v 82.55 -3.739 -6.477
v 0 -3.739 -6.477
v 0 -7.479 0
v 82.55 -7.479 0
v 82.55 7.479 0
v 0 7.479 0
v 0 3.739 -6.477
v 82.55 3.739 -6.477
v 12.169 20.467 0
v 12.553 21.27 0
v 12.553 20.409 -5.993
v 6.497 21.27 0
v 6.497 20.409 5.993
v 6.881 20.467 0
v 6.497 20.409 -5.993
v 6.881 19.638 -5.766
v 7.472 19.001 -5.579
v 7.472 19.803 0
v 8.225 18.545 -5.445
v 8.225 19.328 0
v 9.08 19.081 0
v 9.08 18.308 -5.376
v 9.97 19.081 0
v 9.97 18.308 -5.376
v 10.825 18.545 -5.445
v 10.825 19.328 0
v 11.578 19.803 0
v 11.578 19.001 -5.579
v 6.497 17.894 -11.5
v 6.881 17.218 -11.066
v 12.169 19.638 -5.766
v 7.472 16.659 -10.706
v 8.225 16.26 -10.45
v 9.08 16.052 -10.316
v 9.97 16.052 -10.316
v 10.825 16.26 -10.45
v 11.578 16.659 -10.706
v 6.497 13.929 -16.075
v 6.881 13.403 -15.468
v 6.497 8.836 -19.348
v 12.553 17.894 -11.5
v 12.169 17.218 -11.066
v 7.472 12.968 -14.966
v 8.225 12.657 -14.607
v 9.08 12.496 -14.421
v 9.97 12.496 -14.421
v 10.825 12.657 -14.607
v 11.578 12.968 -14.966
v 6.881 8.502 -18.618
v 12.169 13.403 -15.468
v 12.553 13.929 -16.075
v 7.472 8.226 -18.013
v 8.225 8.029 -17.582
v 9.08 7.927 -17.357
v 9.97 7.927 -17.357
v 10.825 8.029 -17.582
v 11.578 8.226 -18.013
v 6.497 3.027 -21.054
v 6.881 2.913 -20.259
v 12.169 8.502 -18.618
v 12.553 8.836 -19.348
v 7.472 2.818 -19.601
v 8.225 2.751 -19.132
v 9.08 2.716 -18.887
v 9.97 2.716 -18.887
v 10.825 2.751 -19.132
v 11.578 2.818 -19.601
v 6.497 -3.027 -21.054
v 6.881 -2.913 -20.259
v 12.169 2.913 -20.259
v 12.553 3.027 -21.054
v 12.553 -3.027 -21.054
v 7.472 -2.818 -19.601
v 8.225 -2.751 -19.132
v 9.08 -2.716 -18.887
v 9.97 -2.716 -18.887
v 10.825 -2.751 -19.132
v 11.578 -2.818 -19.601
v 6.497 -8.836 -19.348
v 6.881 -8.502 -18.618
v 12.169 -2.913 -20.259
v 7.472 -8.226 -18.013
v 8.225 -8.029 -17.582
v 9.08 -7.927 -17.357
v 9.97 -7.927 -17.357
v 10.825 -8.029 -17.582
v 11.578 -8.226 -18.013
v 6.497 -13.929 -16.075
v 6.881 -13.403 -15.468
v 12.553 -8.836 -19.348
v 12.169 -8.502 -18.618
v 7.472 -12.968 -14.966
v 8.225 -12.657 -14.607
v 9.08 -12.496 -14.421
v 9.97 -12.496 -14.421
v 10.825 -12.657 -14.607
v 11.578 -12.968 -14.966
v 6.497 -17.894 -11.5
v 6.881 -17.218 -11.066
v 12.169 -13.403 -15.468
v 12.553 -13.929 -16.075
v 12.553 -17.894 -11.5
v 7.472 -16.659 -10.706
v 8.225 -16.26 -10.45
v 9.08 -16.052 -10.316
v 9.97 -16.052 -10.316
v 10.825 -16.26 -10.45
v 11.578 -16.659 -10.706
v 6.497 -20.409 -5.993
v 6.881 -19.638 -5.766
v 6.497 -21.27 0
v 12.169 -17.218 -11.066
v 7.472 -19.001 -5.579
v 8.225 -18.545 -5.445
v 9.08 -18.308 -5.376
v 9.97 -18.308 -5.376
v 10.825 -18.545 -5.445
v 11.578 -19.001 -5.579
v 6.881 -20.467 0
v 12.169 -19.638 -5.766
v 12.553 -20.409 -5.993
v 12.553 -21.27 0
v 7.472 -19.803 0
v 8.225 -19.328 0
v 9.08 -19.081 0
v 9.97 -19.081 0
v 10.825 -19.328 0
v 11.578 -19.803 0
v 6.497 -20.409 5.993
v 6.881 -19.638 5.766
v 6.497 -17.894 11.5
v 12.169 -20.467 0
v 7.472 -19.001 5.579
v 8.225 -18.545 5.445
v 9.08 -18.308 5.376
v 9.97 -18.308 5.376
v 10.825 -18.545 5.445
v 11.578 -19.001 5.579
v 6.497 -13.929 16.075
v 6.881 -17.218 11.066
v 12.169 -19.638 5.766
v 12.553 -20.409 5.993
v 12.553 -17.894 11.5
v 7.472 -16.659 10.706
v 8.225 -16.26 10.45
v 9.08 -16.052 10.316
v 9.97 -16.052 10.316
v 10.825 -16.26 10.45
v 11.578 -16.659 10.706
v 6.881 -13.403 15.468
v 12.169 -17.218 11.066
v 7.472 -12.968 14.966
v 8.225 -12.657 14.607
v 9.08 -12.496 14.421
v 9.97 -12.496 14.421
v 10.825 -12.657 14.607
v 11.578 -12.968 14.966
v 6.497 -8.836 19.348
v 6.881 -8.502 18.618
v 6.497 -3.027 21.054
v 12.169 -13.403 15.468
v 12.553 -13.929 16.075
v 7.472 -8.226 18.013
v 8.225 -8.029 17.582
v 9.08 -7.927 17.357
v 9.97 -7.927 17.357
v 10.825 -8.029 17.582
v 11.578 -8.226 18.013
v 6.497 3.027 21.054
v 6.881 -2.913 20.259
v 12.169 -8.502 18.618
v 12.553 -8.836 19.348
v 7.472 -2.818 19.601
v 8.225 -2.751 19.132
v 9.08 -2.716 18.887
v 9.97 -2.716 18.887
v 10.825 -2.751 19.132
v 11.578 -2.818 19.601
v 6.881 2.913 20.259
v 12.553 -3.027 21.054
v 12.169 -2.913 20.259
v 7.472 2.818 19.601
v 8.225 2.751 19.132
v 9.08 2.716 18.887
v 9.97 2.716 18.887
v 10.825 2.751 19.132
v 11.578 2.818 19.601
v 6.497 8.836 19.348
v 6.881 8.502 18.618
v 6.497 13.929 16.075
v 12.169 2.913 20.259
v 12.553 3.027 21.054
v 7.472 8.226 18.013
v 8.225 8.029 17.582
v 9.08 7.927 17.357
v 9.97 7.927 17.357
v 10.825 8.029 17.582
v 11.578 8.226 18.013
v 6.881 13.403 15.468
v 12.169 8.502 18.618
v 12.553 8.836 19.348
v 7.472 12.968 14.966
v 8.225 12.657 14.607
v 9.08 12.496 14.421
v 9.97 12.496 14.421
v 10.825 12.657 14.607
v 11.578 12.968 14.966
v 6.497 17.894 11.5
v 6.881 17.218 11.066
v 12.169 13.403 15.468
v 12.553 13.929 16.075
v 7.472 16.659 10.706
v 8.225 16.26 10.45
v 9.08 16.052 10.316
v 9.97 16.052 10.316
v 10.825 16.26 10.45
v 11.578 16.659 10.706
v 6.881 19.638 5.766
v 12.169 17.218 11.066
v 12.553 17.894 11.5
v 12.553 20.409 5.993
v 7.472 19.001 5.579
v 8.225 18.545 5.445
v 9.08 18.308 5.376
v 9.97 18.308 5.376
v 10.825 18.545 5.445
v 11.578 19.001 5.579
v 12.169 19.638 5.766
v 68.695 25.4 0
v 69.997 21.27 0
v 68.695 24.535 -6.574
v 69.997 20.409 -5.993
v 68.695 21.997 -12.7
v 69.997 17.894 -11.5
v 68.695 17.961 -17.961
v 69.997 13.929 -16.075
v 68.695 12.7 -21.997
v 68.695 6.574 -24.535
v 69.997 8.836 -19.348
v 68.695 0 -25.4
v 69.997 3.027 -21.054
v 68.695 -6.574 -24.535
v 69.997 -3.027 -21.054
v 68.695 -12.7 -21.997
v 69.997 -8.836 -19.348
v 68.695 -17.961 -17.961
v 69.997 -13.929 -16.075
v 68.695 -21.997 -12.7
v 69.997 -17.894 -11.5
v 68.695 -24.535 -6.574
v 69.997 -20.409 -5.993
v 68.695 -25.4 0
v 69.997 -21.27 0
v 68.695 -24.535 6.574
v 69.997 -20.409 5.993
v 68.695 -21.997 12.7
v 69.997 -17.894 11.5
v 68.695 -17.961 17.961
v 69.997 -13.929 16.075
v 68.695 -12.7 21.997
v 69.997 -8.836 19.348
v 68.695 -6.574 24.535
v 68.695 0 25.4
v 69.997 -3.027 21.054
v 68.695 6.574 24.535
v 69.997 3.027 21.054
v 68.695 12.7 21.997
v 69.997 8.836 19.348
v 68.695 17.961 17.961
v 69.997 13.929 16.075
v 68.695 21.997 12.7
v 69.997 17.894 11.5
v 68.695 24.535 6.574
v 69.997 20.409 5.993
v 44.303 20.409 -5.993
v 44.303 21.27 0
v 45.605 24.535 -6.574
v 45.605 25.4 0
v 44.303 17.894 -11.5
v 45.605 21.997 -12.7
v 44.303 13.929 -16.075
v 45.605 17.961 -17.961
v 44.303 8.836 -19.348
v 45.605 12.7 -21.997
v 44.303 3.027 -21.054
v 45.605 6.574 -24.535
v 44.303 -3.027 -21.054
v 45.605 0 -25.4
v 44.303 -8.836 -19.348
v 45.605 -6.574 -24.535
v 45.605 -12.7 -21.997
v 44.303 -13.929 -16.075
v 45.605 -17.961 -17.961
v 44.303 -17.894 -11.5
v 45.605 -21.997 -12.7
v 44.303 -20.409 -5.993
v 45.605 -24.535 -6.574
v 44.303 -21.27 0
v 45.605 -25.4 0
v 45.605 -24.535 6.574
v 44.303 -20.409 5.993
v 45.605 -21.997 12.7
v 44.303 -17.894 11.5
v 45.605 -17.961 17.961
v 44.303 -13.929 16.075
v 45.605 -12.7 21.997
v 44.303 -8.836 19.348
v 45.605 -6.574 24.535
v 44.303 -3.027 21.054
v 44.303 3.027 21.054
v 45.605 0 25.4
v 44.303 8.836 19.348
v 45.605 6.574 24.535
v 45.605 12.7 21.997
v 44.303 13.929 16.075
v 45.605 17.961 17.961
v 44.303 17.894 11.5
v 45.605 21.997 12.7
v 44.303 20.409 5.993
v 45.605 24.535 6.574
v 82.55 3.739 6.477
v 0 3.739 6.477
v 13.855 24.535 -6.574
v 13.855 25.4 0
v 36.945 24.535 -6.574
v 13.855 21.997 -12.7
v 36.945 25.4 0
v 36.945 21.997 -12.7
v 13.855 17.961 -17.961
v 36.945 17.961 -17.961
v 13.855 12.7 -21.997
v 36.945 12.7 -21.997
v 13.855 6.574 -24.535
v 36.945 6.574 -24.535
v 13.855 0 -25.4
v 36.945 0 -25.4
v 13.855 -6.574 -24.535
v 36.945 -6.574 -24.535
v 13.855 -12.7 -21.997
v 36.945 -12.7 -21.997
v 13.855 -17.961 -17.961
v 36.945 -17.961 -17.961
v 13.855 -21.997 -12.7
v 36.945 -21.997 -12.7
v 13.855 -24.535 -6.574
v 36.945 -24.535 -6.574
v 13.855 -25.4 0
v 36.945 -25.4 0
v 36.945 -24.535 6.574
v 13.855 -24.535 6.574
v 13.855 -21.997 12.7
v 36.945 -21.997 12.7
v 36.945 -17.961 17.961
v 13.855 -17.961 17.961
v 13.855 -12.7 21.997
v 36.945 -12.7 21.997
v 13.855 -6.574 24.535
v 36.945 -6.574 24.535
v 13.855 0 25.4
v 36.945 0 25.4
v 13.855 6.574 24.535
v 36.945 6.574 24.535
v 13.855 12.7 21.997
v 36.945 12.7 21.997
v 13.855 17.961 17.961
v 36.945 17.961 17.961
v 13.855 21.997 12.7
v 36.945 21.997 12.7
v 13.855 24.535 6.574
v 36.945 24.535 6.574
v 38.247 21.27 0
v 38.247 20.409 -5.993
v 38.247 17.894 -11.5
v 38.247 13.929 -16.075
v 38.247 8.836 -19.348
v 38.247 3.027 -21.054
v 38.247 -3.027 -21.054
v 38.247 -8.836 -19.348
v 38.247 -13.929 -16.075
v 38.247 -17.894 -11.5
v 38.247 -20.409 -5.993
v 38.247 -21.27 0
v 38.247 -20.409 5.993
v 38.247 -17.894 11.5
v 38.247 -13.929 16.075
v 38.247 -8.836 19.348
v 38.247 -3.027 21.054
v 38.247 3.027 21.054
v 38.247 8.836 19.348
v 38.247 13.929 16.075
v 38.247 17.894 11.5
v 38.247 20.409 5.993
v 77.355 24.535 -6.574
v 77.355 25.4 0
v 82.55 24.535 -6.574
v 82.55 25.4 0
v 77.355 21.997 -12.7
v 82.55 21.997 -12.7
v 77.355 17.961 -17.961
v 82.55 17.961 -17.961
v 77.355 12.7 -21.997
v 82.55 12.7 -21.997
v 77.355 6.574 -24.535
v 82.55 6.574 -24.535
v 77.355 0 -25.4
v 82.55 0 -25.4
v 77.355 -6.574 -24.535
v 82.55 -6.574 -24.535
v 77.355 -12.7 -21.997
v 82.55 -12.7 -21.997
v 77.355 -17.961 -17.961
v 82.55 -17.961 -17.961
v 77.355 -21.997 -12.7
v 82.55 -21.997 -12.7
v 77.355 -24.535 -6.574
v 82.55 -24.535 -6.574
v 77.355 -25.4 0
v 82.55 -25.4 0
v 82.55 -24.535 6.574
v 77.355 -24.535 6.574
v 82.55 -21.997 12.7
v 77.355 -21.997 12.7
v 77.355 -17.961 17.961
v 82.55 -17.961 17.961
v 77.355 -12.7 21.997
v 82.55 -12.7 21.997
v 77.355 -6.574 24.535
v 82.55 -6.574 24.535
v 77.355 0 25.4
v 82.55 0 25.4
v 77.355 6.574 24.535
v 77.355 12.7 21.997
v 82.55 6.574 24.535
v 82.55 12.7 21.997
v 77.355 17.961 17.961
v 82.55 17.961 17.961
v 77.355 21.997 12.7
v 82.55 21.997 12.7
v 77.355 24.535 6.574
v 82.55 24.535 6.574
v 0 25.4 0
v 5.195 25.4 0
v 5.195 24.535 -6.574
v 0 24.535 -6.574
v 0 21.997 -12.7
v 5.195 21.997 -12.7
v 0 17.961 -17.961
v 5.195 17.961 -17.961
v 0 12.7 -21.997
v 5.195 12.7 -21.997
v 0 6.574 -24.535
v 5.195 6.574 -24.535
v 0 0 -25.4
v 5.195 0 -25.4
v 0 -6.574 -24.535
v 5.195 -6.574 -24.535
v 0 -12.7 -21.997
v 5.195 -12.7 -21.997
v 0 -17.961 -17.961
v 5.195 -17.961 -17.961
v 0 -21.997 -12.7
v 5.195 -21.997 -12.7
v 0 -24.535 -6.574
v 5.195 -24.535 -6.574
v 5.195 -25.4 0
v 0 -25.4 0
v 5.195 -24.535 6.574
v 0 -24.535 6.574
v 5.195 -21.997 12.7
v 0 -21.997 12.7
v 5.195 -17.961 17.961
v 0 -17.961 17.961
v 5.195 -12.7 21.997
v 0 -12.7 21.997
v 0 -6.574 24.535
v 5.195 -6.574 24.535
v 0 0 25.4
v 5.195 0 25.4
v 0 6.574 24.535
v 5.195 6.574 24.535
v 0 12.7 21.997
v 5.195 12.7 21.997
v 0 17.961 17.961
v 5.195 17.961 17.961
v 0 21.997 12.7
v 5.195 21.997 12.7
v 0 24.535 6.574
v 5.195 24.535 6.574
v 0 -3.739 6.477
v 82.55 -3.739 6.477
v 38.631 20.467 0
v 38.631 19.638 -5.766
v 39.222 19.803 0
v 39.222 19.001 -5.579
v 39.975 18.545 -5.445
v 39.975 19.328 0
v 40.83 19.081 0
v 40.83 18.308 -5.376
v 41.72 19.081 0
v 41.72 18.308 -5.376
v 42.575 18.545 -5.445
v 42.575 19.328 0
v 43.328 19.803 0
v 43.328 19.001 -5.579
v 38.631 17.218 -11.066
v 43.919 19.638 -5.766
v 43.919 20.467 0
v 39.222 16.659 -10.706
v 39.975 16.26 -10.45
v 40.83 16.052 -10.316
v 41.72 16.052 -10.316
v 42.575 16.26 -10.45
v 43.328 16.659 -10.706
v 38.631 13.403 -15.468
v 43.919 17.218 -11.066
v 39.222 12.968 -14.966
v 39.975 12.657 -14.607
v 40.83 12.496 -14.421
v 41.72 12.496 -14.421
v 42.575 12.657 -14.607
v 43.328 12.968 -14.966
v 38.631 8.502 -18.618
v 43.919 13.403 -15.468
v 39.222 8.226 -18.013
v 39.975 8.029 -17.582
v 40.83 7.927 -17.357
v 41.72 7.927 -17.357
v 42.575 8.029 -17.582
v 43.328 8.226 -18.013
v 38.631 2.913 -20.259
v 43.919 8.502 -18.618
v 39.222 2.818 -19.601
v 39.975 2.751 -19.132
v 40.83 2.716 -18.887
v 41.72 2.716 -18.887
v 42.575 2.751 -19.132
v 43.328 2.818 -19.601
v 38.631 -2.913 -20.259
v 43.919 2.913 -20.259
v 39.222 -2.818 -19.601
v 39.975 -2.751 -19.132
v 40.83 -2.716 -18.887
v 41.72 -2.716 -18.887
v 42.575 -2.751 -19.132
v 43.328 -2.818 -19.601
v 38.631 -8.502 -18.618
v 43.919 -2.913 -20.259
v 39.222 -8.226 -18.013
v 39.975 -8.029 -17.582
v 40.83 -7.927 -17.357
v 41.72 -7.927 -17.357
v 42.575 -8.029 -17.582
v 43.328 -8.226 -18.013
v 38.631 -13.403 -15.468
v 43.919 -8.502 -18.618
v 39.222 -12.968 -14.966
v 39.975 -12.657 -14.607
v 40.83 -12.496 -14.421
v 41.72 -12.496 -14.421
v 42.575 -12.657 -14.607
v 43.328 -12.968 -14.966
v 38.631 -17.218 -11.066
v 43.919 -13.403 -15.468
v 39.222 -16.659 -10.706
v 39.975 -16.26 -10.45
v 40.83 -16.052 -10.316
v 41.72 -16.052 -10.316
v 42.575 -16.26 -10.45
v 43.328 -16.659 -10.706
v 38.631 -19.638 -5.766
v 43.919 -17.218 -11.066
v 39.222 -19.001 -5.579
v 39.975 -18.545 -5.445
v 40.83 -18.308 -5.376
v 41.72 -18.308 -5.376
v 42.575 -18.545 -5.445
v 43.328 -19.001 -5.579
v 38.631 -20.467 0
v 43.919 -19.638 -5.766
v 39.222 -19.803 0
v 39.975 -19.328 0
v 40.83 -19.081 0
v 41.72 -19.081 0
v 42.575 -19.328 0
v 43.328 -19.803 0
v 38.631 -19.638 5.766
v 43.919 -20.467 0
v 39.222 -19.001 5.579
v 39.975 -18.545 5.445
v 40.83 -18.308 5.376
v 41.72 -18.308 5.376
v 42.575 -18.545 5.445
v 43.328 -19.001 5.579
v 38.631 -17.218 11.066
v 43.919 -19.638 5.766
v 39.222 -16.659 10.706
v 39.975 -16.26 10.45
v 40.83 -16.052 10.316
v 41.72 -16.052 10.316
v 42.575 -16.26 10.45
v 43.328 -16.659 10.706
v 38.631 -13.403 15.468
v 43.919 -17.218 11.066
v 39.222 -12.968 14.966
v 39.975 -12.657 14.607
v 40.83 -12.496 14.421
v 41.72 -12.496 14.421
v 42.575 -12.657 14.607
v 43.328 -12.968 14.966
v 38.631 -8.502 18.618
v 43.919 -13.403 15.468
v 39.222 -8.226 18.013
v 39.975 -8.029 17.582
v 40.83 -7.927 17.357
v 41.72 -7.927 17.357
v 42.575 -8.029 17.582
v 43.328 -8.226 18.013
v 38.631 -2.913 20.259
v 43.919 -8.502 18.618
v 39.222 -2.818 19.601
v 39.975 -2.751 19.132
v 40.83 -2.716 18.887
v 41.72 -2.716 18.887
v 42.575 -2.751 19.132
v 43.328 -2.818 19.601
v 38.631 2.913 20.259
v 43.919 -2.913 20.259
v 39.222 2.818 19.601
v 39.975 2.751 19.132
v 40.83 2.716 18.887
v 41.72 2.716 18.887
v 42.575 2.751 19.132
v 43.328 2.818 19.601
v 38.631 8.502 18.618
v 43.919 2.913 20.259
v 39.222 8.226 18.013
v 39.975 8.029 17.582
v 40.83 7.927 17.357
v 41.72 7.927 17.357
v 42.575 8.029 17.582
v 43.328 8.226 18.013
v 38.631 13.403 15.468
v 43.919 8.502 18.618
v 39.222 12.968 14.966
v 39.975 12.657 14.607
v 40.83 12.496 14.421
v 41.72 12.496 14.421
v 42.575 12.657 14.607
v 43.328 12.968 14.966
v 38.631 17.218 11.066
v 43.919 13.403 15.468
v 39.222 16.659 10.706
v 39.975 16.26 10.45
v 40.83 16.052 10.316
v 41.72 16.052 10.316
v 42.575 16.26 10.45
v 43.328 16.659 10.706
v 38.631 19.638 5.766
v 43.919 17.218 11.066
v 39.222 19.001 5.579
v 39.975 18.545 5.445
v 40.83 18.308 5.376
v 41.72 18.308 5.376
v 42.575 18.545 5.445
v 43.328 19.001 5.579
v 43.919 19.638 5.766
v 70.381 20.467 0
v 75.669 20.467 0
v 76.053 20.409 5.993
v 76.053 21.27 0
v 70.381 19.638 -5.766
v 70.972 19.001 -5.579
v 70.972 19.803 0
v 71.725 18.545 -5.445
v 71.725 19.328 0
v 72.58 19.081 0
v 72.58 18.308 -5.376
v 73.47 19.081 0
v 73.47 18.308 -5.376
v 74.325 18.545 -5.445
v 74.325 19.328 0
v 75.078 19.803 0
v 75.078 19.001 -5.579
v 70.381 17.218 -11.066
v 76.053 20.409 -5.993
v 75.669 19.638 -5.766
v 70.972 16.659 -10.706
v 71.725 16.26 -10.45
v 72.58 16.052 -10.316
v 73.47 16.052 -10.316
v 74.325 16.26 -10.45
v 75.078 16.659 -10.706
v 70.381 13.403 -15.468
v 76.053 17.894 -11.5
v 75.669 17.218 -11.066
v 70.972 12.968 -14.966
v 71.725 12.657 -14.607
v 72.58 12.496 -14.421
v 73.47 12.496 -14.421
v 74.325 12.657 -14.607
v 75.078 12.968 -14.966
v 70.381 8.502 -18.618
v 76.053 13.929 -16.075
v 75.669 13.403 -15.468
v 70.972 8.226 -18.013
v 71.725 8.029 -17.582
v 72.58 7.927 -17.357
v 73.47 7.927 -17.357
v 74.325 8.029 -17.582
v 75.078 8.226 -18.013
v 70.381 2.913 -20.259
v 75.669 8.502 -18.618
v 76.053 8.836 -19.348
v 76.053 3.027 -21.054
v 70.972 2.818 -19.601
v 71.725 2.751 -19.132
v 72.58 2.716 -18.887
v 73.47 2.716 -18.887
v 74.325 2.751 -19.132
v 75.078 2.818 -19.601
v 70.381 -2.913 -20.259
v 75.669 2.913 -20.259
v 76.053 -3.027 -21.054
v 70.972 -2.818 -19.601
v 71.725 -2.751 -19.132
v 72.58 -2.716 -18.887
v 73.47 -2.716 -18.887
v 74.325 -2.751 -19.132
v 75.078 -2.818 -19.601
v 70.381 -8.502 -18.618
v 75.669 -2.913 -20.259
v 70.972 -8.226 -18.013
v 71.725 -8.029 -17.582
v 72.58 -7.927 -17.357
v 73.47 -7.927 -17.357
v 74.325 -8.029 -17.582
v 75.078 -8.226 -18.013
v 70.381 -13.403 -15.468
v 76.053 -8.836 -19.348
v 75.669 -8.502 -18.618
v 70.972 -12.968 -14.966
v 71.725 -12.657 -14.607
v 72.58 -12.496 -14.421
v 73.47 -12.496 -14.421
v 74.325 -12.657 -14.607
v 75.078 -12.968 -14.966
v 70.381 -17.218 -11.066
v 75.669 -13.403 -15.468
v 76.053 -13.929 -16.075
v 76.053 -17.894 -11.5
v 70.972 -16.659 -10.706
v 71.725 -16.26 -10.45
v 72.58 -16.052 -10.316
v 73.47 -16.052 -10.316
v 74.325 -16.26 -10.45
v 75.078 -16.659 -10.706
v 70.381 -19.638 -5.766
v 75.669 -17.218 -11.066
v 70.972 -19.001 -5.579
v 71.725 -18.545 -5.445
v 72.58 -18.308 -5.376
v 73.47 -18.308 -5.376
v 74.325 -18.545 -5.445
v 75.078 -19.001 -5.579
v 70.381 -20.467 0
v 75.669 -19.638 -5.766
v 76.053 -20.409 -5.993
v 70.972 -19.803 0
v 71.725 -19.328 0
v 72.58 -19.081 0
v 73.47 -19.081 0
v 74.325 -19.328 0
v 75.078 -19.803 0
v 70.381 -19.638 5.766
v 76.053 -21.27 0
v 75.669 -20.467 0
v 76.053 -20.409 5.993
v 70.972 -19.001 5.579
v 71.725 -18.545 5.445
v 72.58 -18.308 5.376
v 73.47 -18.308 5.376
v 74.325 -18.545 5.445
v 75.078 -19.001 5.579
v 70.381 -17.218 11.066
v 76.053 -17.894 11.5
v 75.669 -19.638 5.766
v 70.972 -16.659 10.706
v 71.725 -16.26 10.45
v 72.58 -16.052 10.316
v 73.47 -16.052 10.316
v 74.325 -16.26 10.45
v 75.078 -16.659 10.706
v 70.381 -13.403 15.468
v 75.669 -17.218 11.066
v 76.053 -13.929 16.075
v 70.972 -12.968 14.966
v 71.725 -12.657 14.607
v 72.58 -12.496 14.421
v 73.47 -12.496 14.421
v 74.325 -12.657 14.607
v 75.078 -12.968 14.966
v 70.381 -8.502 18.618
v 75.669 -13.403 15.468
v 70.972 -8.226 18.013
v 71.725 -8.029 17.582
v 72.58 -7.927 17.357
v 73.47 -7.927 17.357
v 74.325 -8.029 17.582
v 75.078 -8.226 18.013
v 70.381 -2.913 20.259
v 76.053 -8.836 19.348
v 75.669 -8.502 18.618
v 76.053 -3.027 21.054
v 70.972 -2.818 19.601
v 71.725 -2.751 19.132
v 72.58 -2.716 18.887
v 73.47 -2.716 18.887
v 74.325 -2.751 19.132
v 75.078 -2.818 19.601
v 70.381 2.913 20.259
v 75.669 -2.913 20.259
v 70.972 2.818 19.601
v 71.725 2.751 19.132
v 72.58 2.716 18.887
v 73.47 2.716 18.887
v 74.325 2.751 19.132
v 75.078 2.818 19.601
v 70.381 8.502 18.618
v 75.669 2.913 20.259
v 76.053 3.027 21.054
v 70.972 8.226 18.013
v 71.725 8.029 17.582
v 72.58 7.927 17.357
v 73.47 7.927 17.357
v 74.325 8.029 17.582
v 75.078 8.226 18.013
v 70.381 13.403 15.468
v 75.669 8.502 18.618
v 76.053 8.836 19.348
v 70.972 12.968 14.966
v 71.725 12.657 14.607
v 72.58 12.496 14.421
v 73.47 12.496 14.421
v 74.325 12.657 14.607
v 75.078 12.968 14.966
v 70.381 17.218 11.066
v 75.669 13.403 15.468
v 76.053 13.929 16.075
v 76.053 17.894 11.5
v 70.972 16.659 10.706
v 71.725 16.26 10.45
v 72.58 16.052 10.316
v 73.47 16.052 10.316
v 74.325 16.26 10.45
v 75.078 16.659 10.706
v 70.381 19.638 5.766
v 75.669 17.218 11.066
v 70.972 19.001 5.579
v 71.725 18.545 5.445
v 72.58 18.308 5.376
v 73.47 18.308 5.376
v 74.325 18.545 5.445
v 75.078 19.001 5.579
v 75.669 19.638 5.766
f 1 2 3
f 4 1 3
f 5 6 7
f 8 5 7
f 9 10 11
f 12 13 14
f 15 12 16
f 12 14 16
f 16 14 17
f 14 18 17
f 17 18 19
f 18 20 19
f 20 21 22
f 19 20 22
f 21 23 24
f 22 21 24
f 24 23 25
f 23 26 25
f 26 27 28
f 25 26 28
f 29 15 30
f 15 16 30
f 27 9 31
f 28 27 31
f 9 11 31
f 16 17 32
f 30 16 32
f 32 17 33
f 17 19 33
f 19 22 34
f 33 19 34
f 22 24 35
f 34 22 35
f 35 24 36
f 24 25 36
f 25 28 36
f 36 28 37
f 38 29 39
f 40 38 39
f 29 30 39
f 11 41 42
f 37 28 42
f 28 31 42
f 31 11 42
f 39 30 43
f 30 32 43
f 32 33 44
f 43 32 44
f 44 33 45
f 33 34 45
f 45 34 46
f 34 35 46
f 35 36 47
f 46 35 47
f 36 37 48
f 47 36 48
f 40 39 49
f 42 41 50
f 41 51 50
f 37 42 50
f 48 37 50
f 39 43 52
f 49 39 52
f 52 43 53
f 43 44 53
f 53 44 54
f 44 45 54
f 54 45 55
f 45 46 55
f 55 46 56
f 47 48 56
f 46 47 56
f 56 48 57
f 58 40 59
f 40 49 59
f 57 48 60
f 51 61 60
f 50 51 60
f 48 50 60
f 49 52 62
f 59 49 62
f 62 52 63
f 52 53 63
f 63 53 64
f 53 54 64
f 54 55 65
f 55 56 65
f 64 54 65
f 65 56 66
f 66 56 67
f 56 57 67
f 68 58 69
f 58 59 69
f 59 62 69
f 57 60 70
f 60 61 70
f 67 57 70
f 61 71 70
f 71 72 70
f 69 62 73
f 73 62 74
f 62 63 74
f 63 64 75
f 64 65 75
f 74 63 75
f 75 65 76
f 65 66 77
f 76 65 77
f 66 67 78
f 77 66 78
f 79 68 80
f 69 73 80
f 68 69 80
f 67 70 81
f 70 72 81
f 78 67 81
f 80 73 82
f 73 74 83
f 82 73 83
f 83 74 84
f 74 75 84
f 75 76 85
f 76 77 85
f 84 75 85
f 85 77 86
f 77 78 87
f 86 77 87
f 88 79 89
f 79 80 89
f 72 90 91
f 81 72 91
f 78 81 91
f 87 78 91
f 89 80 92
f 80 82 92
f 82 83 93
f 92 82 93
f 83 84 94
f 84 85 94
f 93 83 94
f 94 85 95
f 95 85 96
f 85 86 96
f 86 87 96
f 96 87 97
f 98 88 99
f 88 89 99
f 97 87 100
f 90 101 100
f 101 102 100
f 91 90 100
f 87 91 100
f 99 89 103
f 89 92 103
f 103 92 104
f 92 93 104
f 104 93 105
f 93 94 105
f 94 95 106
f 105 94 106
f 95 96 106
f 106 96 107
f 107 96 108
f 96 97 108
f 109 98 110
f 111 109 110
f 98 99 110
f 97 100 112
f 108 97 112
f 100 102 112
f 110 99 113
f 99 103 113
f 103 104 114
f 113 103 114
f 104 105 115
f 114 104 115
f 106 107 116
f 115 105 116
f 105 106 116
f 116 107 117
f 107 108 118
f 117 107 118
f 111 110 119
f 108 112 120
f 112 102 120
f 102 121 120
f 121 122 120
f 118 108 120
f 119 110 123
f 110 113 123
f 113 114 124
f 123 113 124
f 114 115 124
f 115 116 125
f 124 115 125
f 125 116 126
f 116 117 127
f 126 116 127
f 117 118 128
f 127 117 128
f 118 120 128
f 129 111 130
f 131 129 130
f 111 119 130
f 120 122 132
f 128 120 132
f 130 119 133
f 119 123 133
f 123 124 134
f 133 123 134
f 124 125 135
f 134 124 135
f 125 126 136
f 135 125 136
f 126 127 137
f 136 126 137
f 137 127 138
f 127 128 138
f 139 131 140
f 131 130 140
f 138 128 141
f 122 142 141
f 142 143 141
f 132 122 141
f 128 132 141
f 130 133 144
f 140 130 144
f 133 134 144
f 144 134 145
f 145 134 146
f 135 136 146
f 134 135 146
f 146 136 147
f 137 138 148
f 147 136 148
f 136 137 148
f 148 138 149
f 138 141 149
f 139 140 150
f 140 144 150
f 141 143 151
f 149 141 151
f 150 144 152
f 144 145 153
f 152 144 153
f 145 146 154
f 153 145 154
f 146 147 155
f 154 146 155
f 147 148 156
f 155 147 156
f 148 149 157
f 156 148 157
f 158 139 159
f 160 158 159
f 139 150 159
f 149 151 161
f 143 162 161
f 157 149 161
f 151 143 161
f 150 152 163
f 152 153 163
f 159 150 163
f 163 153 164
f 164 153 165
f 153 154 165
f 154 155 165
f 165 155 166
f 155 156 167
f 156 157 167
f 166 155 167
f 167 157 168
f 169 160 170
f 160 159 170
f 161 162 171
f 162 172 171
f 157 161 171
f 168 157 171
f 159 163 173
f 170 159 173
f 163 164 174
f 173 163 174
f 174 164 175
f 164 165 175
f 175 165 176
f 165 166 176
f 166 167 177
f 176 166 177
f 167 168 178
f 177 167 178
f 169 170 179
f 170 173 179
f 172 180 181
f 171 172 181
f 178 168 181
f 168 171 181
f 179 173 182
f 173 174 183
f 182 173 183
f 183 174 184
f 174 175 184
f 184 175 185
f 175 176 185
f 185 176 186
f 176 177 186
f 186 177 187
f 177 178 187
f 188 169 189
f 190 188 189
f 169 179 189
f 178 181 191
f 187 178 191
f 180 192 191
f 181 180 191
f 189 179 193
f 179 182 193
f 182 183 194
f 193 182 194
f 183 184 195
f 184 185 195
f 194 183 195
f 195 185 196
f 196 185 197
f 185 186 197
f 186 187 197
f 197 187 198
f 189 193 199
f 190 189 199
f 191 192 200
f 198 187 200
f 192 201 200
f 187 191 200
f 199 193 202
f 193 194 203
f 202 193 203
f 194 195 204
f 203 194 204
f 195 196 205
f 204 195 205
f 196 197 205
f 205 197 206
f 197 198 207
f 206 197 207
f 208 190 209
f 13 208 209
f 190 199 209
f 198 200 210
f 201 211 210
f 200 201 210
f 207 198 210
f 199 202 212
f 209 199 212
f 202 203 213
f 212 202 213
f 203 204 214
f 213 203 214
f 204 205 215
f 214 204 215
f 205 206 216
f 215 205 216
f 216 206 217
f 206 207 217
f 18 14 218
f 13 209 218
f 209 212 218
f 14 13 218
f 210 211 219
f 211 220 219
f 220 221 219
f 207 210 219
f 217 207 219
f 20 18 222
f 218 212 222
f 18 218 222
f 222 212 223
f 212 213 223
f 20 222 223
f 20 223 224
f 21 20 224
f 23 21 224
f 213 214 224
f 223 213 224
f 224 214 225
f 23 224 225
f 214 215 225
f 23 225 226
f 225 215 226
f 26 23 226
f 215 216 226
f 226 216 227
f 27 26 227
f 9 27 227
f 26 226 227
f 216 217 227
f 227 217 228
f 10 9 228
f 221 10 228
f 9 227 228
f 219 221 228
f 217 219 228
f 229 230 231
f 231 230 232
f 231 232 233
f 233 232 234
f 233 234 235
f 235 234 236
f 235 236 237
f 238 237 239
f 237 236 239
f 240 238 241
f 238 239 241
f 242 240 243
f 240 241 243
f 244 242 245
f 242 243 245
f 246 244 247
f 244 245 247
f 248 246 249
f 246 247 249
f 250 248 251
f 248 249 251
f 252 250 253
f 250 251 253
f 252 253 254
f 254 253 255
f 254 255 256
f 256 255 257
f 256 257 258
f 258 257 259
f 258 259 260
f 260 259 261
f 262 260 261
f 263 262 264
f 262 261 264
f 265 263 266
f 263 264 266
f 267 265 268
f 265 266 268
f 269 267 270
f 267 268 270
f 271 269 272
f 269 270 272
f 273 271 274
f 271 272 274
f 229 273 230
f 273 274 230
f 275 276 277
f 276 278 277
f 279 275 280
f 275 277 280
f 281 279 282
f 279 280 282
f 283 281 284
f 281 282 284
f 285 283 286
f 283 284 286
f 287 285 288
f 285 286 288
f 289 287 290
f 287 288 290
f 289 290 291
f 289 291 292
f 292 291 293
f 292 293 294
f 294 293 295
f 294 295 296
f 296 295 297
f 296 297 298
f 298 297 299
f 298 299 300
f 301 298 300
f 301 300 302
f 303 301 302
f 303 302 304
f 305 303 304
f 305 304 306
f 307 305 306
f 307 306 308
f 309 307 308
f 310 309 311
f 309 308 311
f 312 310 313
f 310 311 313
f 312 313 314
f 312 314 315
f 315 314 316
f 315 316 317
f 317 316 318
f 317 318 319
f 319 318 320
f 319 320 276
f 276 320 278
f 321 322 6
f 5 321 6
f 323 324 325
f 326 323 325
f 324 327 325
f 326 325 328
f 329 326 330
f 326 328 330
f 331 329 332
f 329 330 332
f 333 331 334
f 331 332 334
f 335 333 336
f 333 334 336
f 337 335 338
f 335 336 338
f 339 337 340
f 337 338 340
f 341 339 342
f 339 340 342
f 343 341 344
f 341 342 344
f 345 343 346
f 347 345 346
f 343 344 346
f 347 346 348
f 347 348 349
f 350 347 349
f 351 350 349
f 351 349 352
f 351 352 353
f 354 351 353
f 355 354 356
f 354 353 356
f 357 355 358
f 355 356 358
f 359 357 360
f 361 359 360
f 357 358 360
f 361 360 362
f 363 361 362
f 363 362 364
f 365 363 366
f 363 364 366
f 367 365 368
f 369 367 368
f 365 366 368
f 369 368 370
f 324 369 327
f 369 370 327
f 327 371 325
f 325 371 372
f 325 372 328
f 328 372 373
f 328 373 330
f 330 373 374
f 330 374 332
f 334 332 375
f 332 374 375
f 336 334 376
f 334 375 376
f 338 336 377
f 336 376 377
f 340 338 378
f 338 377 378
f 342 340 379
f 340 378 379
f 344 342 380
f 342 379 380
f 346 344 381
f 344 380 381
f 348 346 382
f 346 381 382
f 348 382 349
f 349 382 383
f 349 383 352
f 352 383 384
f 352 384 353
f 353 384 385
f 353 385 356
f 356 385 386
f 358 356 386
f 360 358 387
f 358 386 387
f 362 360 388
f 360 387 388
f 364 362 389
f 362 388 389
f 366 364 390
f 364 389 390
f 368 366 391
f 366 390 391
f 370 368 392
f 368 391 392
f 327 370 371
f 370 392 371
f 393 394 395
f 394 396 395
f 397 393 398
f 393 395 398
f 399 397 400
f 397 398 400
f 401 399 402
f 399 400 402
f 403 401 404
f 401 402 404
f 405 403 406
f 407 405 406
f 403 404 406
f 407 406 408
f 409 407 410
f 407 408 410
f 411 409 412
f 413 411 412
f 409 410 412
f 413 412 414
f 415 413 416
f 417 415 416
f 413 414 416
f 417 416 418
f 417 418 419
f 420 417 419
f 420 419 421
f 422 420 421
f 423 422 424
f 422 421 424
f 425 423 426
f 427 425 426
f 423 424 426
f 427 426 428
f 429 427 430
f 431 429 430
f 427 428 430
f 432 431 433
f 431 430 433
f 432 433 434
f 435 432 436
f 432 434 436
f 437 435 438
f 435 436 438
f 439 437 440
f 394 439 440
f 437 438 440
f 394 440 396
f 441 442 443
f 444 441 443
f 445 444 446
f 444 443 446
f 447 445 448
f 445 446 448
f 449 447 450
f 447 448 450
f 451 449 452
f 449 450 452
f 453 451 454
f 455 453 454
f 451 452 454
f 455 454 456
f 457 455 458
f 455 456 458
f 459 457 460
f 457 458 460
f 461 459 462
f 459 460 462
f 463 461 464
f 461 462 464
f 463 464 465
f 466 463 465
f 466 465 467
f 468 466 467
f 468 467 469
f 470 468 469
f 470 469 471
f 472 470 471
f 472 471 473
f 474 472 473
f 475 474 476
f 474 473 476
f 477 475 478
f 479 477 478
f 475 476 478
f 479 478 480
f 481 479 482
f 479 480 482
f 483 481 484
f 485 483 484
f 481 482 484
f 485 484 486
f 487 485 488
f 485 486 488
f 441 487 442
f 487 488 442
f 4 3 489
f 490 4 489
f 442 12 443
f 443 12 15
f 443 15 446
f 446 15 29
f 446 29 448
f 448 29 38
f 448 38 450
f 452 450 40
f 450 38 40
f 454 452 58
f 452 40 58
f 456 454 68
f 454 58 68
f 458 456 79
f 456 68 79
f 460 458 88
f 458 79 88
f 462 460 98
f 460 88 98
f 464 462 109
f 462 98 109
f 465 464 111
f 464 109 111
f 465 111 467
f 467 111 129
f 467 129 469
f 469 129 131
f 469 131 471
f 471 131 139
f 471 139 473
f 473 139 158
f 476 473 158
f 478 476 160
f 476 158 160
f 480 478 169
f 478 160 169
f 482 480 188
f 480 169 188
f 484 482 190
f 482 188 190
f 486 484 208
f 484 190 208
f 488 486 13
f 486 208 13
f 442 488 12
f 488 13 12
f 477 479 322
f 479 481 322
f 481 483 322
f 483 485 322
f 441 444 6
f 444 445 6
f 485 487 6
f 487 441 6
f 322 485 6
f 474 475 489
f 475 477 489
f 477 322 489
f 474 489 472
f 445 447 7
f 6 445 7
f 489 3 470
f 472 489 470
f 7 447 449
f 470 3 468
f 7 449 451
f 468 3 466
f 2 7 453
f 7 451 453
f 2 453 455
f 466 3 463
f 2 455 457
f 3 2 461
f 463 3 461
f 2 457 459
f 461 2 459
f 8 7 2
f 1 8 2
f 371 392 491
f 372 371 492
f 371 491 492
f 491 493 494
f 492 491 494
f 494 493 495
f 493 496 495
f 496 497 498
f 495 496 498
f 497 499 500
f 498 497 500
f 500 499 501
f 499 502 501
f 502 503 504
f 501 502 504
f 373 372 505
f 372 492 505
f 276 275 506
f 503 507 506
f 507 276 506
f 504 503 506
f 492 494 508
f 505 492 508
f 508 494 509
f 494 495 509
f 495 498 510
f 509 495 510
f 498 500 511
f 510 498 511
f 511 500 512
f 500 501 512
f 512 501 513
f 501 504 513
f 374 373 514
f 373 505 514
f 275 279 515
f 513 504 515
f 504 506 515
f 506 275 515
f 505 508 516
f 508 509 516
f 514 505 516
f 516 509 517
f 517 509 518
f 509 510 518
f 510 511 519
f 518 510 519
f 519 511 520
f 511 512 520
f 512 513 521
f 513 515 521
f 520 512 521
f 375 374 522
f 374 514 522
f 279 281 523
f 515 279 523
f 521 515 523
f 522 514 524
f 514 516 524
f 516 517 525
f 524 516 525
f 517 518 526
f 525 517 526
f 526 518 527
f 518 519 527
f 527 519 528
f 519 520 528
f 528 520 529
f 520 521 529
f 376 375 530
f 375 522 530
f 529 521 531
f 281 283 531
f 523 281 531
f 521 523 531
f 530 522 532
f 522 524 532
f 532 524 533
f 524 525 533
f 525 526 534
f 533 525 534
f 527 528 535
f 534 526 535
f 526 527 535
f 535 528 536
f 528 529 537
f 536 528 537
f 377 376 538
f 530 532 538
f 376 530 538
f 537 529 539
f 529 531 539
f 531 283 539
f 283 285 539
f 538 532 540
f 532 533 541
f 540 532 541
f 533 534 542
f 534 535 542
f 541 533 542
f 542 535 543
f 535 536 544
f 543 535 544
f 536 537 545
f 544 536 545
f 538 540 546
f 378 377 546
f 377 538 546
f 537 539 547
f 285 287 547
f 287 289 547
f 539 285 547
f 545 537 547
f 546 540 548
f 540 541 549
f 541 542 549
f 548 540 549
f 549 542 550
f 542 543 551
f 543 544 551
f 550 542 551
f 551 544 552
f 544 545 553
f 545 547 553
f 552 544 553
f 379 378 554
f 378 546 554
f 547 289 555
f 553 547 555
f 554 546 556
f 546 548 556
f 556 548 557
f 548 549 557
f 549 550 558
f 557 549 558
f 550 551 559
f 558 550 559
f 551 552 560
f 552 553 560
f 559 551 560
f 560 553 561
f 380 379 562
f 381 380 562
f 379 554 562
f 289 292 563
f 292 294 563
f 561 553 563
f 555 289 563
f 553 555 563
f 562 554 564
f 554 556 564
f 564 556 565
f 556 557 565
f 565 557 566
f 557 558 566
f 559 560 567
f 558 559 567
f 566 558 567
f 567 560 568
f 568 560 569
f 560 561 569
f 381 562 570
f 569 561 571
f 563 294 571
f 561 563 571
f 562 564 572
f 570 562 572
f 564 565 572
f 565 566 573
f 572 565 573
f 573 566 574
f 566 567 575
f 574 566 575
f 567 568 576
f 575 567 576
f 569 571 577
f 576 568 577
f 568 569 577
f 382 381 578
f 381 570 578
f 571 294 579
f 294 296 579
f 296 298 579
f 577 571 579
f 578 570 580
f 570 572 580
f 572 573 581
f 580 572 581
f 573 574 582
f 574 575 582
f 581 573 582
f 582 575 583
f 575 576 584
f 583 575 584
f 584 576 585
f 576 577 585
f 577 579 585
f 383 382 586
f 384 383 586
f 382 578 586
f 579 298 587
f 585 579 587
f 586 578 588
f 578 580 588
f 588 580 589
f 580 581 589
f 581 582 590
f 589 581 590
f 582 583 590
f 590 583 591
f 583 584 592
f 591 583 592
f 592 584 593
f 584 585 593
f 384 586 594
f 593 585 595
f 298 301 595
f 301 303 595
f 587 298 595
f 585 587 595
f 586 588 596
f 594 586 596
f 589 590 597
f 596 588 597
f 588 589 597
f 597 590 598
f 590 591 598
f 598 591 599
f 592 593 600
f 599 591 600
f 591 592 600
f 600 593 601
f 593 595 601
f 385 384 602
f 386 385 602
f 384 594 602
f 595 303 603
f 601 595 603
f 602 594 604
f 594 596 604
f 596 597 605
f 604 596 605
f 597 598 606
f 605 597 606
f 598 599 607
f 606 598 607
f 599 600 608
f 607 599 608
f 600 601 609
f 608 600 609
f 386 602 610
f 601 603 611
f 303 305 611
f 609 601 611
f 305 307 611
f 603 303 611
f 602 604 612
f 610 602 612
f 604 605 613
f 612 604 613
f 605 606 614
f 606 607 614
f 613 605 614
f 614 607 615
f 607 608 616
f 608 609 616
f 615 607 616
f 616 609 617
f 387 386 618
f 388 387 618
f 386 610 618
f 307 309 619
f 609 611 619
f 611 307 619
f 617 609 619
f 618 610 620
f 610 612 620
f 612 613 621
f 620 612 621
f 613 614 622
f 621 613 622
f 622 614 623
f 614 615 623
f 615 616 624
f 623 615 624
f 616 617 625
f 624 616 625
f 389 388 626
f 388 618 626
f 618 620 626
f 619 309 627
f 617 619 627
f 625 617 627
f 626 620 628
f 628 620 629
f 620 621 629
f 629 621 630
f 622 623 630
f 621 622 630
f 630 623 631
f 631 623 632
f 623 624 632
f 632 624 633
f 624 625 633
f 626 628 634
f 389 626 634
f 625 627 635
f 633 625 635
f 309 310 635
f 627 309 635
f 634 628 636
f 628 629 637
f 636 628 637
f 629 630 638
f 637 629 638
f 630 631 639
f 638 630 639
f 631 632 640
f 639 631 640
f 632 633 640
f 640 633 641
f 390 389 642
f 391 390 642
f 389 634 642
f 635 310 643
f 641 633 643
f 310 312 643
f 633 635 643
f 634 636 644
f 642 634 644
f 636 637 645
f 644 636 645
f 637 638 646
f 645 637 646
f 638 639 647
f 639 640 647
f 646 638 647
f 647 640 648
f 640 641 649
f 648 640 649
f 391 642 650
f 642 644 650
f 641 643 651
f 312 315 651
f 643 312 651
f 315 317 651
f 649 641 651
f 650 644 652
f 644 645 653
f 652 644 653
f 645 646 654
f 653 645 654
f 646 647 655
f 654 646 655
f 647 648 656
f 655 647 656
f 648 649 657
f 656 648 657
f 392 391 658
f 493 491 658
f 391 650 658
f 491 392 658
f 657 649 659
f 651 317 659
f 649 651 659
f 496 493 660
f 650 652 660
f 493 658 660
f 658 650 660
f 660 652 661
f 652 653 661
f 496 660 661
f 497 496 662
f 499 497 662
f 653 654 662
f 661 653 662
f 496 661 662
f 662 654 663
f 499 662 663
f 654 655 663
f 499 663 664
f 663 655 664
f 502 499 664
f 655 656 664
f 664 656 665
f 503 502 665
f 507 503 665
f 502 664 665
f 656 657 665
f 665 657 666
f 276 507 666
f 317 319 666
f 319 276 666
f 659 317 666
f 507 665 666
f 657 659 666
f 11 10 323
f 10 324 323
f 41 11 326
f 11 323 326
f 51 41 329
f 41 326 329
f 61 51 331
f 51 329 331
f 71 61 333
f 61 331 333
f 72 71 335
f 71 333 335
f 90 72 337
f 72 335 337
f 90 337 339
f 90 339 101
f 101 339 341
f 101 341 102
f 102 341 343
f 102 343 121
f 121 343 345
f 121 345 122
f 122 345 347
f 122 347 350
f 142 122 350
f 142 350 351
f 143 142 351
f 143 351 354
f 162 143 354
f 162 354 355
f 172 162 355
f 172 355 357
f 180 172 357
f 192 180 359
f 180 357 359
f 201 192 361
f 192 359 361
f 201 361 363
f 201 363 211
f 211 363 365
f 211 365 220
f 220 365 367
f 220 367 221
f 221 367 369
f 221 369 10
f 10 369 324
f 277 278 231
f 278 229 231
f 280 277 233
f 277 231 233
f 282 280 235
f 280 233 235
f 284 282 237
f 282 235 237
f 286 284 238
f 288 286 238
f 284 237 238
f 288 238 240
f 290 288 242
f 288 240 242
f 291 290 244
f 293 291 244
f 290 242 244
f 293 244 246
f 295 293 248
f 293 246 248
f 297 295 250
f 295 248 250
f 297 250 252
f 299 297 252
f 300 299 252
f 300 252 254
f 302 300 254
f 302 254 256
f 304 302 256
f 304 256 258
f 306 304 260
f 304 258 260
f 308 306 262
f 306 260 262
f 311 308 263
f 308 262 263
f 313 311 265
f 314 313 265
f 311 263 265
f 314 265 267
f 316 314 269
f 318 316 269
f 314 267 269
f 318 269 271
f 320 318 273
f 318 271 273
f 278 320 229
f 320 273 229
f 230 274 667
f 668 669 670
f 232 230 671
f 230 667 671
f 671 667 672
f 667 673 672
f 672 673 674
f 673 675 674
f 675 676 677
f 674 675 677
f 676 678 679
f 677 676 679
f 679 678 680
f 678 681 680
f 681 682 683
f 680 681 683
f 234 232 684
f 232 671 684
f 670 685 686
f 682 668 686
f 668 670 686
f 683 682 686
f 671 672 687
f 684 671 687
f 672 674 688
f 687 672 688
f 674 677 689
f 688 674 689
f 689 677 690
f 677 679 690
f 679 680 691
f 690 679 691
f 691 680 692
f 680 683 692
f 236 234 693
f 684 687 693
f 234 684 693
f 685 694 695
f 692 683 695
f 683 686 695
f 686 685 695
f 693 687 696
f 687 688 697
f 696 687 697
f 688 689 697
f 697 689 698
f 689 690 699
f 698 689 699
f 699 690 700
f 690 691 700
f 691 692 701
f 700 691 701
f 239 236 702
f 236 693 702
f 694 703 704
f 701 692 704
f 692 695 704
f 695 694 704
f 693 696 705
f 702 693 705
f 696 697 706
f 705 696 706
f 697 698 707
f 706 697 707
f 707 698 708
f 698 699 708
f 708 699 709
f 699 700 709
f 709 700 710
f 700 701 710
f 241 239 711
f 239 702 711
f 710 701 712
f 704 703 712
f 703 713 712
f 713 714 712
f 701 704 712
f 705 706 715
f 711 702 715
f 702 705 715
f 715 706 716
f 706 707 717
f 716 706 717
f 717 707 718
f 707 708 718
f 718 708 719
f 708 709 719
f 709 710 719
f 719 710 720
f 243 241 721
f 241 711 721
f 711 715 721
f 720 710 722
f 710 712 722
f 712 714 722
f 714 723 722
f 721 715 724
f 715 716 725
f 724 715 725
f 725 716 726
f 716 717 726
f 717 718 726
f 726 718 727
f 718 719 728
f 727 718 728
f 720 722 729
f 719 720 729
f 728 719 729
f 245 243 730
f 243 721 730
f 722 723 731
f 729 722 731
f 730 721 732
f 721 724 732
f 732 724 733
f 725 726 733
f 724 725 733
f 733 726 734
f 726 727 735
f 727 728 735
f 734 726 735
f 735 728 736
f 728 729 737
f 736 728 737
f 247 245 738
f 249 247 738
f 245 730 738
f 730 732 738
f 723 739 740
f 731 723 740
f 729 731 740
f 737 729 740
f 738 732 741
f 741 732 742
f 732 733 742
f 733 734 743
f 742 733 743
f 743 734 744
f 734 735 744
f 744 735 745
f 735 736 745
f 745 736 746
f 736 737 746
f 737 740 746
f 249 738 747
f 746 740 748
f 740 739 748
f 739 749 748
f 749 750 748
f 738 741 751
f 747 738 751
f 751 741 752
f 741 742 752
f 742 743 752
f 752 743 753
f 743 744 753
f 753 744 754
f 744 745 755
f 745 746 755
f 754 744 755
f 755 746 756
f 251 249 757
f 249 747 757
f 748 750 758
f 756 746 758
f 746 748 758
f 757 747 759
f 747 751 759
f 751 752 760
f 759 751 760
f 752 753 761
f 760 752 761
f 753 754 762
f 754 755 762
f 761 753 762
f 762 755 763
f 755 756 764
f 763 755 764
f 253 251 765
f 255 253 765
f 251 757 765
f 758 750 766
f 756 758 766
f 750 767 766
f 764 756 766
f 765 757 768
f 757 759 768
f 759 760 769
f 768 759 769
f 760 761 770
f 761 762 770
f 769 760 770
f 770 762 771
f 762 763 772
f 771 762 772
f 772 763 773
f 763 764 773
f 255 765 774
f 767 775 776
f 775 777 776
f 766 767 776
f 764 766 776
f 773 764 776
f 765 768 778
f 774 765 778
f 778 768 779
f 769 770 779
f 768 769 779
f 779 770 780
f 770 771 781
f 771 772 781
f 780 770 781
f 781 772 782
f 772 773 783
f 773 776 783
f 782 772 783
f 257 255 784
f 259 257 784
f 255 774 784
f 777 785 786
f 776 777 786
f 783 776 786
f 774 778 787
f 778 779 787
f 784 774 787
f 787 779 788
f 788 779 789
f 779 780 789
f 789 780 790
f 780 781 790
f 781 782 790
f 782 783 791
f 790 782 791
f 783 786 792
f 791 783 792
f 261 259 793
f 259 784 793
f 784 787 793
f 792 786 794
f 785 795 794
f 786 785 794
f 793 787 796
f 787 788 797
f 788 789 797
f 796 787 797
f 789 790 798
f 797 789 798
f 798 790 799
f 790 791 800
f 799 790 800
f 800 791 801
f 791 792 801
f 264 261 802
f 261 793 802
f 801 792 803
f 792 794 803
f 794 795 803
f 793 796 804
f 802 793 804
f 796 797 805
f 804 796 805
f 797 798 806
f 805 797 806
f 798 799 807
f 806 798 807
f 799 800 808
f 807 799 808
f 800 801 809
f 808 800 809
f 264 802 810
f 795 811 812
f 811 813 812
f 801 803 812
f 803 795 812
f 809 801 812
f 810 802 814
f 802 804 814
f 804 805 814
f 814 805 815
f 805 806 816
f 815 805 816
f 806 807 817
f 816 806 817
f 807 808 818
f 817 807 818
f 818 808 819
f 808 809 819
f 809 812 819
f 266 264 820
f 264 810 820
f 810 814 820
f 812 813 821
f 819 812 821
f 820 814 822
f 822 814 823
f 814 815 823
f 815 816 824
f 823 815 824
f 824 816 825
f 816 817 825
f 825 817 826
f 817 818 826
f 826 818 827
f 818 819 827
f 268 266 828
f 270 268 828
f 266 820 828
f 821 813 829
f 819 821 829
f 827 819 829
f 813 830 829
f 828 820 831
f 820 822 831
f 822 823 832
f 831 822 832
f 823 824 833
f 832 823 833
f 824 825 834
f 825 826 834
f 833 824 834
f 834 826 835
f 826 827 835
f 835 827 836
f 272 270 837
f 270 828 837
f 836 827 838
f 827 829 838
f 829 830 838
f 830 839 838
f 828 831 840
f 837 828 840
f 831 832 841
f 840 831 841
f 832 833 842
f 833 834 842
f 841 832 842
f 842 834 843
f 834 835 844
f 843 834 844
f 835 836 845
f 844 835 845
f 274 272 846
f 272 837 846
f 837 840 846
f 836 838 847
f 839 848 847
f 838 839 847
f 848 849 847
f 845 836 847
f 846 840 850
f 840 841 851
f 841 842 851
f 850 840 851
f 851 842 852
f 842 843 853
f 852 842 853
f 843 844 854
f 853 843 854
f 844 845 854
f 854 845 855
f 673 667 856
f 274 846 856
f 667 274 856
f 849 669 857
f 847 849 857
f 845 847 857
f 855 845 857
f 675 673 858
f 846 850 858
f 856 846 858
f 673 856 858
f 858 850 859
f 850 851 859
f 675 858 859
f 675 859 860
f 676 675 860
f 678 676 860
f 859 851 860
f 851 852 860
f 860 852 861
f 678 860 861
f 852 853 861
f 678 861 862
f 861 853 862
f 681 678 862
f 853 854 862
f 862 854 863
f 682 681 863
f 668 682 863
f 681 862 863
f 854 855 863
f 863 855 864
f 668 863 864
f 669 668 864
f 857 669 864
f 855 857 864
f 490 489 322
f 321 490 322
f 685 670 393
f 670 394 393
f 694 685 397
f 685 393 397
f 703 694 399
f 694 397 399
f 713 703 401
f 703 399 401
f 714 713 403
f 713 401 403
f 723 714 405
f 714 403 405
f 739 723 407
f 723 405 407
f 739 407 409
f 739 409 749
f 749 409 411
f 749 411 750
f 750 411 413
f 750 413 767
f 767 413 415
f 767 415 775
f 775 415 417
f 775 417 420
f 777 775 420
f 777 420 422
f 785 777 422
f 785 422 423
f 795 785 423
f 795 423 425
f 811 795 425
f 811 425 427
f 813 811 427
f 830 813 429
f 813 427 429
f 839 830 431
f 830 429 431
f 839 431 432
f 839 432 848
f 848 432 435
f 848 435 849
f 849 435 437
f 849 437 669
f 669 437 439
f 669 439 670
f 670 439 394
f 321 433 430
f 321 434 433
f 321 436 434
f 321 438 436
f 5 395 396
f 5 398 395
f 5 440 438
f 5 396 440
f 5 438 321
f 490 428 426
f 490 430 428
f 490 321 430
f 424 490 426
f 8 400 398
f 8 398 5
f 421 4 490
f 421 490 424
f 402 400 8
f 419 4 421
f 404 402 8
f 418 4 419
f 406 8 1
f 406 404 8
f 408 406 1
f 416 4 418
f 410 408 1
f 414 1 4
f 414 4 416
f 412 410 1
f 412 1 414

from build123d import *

# Parameters (mm, degrees)
SKETCH1_W          = 82.55
SKETCH1_H          = 25.4
CUT_EXTRUDE1_DEPTH = 83.55


with BuildPart() as part:
    # Sketch1 → Revolve1 (revolve)
    with BuildSketch(Plane.XY):
        with Locations((41.275, 12.7)):
            Rectangle(SKETCH1_W, SKETCH1_H)
    revolve(axis=Axis((0, 0, 0), (-1, 0, 0)))

    # Sketch2 → Cut-Revolve1 (revolve, cut)
    with BuildSketch(Plane.XY):
        with BuildLine():
            Line((5.194846373, 25.4), (6.496948681, 21.270259087))
            ThreePointArc((6.496948681, 21.270259087), (9.525, 19.05), (12.553051319, 21.270259087))
            Line((12.553051319, 21.270259087), (13.855153627, 25.4))
            Line((13.855153627, 25.4), (5.194846373, 25.4))
        make_face()
        with BuildLine():
            Line((36.944846373, 25.4), (38.246948681, 21.270259087))
            ThreePointArc((38.246948681, 21.270259087), (41.275, 19.05), (44.303051319, 21.270259087))
            Line((44.303051319, 21.270259087), (45.605153627, 25.4))
            Line((45.605153627, 25.4), (36.944846373, 25.4))
        make_face()
        with BuildLine():
            Line((68.694846373, 25.4), (69.996948681, 21.270259087))
            ThreePointArc((69.996948681, 21.270259087), (73.025, 19.05), (76.053051319, 21.270259087))
            Line((76.053051319, 21.270259087), (77.355153627, 25.4))
            Line((77.355153627, 25.4), (68.694846373, 25.4))
        make_face()
    revolve(axis=Axis((0, 0, 0), (-1, 0, 0)), mode=Mode.SUBTRACT)

    # Sketch3 → Cut-Extrude1 (cut, through all)
    with BuildSketch(Plane.ZY):
        Polygon((0, 7.478995387), (-6.477, 3.739497694), (-6.477, -3.739497694), (0, -7.478995387), (6.477, -3.739497694), (6.477, 3.739497694), align=None)
    extrude(amount=-CUT_EXTRUDE1_DEPTH, mode=Mode.SUBTRACT)


solid = part.part
